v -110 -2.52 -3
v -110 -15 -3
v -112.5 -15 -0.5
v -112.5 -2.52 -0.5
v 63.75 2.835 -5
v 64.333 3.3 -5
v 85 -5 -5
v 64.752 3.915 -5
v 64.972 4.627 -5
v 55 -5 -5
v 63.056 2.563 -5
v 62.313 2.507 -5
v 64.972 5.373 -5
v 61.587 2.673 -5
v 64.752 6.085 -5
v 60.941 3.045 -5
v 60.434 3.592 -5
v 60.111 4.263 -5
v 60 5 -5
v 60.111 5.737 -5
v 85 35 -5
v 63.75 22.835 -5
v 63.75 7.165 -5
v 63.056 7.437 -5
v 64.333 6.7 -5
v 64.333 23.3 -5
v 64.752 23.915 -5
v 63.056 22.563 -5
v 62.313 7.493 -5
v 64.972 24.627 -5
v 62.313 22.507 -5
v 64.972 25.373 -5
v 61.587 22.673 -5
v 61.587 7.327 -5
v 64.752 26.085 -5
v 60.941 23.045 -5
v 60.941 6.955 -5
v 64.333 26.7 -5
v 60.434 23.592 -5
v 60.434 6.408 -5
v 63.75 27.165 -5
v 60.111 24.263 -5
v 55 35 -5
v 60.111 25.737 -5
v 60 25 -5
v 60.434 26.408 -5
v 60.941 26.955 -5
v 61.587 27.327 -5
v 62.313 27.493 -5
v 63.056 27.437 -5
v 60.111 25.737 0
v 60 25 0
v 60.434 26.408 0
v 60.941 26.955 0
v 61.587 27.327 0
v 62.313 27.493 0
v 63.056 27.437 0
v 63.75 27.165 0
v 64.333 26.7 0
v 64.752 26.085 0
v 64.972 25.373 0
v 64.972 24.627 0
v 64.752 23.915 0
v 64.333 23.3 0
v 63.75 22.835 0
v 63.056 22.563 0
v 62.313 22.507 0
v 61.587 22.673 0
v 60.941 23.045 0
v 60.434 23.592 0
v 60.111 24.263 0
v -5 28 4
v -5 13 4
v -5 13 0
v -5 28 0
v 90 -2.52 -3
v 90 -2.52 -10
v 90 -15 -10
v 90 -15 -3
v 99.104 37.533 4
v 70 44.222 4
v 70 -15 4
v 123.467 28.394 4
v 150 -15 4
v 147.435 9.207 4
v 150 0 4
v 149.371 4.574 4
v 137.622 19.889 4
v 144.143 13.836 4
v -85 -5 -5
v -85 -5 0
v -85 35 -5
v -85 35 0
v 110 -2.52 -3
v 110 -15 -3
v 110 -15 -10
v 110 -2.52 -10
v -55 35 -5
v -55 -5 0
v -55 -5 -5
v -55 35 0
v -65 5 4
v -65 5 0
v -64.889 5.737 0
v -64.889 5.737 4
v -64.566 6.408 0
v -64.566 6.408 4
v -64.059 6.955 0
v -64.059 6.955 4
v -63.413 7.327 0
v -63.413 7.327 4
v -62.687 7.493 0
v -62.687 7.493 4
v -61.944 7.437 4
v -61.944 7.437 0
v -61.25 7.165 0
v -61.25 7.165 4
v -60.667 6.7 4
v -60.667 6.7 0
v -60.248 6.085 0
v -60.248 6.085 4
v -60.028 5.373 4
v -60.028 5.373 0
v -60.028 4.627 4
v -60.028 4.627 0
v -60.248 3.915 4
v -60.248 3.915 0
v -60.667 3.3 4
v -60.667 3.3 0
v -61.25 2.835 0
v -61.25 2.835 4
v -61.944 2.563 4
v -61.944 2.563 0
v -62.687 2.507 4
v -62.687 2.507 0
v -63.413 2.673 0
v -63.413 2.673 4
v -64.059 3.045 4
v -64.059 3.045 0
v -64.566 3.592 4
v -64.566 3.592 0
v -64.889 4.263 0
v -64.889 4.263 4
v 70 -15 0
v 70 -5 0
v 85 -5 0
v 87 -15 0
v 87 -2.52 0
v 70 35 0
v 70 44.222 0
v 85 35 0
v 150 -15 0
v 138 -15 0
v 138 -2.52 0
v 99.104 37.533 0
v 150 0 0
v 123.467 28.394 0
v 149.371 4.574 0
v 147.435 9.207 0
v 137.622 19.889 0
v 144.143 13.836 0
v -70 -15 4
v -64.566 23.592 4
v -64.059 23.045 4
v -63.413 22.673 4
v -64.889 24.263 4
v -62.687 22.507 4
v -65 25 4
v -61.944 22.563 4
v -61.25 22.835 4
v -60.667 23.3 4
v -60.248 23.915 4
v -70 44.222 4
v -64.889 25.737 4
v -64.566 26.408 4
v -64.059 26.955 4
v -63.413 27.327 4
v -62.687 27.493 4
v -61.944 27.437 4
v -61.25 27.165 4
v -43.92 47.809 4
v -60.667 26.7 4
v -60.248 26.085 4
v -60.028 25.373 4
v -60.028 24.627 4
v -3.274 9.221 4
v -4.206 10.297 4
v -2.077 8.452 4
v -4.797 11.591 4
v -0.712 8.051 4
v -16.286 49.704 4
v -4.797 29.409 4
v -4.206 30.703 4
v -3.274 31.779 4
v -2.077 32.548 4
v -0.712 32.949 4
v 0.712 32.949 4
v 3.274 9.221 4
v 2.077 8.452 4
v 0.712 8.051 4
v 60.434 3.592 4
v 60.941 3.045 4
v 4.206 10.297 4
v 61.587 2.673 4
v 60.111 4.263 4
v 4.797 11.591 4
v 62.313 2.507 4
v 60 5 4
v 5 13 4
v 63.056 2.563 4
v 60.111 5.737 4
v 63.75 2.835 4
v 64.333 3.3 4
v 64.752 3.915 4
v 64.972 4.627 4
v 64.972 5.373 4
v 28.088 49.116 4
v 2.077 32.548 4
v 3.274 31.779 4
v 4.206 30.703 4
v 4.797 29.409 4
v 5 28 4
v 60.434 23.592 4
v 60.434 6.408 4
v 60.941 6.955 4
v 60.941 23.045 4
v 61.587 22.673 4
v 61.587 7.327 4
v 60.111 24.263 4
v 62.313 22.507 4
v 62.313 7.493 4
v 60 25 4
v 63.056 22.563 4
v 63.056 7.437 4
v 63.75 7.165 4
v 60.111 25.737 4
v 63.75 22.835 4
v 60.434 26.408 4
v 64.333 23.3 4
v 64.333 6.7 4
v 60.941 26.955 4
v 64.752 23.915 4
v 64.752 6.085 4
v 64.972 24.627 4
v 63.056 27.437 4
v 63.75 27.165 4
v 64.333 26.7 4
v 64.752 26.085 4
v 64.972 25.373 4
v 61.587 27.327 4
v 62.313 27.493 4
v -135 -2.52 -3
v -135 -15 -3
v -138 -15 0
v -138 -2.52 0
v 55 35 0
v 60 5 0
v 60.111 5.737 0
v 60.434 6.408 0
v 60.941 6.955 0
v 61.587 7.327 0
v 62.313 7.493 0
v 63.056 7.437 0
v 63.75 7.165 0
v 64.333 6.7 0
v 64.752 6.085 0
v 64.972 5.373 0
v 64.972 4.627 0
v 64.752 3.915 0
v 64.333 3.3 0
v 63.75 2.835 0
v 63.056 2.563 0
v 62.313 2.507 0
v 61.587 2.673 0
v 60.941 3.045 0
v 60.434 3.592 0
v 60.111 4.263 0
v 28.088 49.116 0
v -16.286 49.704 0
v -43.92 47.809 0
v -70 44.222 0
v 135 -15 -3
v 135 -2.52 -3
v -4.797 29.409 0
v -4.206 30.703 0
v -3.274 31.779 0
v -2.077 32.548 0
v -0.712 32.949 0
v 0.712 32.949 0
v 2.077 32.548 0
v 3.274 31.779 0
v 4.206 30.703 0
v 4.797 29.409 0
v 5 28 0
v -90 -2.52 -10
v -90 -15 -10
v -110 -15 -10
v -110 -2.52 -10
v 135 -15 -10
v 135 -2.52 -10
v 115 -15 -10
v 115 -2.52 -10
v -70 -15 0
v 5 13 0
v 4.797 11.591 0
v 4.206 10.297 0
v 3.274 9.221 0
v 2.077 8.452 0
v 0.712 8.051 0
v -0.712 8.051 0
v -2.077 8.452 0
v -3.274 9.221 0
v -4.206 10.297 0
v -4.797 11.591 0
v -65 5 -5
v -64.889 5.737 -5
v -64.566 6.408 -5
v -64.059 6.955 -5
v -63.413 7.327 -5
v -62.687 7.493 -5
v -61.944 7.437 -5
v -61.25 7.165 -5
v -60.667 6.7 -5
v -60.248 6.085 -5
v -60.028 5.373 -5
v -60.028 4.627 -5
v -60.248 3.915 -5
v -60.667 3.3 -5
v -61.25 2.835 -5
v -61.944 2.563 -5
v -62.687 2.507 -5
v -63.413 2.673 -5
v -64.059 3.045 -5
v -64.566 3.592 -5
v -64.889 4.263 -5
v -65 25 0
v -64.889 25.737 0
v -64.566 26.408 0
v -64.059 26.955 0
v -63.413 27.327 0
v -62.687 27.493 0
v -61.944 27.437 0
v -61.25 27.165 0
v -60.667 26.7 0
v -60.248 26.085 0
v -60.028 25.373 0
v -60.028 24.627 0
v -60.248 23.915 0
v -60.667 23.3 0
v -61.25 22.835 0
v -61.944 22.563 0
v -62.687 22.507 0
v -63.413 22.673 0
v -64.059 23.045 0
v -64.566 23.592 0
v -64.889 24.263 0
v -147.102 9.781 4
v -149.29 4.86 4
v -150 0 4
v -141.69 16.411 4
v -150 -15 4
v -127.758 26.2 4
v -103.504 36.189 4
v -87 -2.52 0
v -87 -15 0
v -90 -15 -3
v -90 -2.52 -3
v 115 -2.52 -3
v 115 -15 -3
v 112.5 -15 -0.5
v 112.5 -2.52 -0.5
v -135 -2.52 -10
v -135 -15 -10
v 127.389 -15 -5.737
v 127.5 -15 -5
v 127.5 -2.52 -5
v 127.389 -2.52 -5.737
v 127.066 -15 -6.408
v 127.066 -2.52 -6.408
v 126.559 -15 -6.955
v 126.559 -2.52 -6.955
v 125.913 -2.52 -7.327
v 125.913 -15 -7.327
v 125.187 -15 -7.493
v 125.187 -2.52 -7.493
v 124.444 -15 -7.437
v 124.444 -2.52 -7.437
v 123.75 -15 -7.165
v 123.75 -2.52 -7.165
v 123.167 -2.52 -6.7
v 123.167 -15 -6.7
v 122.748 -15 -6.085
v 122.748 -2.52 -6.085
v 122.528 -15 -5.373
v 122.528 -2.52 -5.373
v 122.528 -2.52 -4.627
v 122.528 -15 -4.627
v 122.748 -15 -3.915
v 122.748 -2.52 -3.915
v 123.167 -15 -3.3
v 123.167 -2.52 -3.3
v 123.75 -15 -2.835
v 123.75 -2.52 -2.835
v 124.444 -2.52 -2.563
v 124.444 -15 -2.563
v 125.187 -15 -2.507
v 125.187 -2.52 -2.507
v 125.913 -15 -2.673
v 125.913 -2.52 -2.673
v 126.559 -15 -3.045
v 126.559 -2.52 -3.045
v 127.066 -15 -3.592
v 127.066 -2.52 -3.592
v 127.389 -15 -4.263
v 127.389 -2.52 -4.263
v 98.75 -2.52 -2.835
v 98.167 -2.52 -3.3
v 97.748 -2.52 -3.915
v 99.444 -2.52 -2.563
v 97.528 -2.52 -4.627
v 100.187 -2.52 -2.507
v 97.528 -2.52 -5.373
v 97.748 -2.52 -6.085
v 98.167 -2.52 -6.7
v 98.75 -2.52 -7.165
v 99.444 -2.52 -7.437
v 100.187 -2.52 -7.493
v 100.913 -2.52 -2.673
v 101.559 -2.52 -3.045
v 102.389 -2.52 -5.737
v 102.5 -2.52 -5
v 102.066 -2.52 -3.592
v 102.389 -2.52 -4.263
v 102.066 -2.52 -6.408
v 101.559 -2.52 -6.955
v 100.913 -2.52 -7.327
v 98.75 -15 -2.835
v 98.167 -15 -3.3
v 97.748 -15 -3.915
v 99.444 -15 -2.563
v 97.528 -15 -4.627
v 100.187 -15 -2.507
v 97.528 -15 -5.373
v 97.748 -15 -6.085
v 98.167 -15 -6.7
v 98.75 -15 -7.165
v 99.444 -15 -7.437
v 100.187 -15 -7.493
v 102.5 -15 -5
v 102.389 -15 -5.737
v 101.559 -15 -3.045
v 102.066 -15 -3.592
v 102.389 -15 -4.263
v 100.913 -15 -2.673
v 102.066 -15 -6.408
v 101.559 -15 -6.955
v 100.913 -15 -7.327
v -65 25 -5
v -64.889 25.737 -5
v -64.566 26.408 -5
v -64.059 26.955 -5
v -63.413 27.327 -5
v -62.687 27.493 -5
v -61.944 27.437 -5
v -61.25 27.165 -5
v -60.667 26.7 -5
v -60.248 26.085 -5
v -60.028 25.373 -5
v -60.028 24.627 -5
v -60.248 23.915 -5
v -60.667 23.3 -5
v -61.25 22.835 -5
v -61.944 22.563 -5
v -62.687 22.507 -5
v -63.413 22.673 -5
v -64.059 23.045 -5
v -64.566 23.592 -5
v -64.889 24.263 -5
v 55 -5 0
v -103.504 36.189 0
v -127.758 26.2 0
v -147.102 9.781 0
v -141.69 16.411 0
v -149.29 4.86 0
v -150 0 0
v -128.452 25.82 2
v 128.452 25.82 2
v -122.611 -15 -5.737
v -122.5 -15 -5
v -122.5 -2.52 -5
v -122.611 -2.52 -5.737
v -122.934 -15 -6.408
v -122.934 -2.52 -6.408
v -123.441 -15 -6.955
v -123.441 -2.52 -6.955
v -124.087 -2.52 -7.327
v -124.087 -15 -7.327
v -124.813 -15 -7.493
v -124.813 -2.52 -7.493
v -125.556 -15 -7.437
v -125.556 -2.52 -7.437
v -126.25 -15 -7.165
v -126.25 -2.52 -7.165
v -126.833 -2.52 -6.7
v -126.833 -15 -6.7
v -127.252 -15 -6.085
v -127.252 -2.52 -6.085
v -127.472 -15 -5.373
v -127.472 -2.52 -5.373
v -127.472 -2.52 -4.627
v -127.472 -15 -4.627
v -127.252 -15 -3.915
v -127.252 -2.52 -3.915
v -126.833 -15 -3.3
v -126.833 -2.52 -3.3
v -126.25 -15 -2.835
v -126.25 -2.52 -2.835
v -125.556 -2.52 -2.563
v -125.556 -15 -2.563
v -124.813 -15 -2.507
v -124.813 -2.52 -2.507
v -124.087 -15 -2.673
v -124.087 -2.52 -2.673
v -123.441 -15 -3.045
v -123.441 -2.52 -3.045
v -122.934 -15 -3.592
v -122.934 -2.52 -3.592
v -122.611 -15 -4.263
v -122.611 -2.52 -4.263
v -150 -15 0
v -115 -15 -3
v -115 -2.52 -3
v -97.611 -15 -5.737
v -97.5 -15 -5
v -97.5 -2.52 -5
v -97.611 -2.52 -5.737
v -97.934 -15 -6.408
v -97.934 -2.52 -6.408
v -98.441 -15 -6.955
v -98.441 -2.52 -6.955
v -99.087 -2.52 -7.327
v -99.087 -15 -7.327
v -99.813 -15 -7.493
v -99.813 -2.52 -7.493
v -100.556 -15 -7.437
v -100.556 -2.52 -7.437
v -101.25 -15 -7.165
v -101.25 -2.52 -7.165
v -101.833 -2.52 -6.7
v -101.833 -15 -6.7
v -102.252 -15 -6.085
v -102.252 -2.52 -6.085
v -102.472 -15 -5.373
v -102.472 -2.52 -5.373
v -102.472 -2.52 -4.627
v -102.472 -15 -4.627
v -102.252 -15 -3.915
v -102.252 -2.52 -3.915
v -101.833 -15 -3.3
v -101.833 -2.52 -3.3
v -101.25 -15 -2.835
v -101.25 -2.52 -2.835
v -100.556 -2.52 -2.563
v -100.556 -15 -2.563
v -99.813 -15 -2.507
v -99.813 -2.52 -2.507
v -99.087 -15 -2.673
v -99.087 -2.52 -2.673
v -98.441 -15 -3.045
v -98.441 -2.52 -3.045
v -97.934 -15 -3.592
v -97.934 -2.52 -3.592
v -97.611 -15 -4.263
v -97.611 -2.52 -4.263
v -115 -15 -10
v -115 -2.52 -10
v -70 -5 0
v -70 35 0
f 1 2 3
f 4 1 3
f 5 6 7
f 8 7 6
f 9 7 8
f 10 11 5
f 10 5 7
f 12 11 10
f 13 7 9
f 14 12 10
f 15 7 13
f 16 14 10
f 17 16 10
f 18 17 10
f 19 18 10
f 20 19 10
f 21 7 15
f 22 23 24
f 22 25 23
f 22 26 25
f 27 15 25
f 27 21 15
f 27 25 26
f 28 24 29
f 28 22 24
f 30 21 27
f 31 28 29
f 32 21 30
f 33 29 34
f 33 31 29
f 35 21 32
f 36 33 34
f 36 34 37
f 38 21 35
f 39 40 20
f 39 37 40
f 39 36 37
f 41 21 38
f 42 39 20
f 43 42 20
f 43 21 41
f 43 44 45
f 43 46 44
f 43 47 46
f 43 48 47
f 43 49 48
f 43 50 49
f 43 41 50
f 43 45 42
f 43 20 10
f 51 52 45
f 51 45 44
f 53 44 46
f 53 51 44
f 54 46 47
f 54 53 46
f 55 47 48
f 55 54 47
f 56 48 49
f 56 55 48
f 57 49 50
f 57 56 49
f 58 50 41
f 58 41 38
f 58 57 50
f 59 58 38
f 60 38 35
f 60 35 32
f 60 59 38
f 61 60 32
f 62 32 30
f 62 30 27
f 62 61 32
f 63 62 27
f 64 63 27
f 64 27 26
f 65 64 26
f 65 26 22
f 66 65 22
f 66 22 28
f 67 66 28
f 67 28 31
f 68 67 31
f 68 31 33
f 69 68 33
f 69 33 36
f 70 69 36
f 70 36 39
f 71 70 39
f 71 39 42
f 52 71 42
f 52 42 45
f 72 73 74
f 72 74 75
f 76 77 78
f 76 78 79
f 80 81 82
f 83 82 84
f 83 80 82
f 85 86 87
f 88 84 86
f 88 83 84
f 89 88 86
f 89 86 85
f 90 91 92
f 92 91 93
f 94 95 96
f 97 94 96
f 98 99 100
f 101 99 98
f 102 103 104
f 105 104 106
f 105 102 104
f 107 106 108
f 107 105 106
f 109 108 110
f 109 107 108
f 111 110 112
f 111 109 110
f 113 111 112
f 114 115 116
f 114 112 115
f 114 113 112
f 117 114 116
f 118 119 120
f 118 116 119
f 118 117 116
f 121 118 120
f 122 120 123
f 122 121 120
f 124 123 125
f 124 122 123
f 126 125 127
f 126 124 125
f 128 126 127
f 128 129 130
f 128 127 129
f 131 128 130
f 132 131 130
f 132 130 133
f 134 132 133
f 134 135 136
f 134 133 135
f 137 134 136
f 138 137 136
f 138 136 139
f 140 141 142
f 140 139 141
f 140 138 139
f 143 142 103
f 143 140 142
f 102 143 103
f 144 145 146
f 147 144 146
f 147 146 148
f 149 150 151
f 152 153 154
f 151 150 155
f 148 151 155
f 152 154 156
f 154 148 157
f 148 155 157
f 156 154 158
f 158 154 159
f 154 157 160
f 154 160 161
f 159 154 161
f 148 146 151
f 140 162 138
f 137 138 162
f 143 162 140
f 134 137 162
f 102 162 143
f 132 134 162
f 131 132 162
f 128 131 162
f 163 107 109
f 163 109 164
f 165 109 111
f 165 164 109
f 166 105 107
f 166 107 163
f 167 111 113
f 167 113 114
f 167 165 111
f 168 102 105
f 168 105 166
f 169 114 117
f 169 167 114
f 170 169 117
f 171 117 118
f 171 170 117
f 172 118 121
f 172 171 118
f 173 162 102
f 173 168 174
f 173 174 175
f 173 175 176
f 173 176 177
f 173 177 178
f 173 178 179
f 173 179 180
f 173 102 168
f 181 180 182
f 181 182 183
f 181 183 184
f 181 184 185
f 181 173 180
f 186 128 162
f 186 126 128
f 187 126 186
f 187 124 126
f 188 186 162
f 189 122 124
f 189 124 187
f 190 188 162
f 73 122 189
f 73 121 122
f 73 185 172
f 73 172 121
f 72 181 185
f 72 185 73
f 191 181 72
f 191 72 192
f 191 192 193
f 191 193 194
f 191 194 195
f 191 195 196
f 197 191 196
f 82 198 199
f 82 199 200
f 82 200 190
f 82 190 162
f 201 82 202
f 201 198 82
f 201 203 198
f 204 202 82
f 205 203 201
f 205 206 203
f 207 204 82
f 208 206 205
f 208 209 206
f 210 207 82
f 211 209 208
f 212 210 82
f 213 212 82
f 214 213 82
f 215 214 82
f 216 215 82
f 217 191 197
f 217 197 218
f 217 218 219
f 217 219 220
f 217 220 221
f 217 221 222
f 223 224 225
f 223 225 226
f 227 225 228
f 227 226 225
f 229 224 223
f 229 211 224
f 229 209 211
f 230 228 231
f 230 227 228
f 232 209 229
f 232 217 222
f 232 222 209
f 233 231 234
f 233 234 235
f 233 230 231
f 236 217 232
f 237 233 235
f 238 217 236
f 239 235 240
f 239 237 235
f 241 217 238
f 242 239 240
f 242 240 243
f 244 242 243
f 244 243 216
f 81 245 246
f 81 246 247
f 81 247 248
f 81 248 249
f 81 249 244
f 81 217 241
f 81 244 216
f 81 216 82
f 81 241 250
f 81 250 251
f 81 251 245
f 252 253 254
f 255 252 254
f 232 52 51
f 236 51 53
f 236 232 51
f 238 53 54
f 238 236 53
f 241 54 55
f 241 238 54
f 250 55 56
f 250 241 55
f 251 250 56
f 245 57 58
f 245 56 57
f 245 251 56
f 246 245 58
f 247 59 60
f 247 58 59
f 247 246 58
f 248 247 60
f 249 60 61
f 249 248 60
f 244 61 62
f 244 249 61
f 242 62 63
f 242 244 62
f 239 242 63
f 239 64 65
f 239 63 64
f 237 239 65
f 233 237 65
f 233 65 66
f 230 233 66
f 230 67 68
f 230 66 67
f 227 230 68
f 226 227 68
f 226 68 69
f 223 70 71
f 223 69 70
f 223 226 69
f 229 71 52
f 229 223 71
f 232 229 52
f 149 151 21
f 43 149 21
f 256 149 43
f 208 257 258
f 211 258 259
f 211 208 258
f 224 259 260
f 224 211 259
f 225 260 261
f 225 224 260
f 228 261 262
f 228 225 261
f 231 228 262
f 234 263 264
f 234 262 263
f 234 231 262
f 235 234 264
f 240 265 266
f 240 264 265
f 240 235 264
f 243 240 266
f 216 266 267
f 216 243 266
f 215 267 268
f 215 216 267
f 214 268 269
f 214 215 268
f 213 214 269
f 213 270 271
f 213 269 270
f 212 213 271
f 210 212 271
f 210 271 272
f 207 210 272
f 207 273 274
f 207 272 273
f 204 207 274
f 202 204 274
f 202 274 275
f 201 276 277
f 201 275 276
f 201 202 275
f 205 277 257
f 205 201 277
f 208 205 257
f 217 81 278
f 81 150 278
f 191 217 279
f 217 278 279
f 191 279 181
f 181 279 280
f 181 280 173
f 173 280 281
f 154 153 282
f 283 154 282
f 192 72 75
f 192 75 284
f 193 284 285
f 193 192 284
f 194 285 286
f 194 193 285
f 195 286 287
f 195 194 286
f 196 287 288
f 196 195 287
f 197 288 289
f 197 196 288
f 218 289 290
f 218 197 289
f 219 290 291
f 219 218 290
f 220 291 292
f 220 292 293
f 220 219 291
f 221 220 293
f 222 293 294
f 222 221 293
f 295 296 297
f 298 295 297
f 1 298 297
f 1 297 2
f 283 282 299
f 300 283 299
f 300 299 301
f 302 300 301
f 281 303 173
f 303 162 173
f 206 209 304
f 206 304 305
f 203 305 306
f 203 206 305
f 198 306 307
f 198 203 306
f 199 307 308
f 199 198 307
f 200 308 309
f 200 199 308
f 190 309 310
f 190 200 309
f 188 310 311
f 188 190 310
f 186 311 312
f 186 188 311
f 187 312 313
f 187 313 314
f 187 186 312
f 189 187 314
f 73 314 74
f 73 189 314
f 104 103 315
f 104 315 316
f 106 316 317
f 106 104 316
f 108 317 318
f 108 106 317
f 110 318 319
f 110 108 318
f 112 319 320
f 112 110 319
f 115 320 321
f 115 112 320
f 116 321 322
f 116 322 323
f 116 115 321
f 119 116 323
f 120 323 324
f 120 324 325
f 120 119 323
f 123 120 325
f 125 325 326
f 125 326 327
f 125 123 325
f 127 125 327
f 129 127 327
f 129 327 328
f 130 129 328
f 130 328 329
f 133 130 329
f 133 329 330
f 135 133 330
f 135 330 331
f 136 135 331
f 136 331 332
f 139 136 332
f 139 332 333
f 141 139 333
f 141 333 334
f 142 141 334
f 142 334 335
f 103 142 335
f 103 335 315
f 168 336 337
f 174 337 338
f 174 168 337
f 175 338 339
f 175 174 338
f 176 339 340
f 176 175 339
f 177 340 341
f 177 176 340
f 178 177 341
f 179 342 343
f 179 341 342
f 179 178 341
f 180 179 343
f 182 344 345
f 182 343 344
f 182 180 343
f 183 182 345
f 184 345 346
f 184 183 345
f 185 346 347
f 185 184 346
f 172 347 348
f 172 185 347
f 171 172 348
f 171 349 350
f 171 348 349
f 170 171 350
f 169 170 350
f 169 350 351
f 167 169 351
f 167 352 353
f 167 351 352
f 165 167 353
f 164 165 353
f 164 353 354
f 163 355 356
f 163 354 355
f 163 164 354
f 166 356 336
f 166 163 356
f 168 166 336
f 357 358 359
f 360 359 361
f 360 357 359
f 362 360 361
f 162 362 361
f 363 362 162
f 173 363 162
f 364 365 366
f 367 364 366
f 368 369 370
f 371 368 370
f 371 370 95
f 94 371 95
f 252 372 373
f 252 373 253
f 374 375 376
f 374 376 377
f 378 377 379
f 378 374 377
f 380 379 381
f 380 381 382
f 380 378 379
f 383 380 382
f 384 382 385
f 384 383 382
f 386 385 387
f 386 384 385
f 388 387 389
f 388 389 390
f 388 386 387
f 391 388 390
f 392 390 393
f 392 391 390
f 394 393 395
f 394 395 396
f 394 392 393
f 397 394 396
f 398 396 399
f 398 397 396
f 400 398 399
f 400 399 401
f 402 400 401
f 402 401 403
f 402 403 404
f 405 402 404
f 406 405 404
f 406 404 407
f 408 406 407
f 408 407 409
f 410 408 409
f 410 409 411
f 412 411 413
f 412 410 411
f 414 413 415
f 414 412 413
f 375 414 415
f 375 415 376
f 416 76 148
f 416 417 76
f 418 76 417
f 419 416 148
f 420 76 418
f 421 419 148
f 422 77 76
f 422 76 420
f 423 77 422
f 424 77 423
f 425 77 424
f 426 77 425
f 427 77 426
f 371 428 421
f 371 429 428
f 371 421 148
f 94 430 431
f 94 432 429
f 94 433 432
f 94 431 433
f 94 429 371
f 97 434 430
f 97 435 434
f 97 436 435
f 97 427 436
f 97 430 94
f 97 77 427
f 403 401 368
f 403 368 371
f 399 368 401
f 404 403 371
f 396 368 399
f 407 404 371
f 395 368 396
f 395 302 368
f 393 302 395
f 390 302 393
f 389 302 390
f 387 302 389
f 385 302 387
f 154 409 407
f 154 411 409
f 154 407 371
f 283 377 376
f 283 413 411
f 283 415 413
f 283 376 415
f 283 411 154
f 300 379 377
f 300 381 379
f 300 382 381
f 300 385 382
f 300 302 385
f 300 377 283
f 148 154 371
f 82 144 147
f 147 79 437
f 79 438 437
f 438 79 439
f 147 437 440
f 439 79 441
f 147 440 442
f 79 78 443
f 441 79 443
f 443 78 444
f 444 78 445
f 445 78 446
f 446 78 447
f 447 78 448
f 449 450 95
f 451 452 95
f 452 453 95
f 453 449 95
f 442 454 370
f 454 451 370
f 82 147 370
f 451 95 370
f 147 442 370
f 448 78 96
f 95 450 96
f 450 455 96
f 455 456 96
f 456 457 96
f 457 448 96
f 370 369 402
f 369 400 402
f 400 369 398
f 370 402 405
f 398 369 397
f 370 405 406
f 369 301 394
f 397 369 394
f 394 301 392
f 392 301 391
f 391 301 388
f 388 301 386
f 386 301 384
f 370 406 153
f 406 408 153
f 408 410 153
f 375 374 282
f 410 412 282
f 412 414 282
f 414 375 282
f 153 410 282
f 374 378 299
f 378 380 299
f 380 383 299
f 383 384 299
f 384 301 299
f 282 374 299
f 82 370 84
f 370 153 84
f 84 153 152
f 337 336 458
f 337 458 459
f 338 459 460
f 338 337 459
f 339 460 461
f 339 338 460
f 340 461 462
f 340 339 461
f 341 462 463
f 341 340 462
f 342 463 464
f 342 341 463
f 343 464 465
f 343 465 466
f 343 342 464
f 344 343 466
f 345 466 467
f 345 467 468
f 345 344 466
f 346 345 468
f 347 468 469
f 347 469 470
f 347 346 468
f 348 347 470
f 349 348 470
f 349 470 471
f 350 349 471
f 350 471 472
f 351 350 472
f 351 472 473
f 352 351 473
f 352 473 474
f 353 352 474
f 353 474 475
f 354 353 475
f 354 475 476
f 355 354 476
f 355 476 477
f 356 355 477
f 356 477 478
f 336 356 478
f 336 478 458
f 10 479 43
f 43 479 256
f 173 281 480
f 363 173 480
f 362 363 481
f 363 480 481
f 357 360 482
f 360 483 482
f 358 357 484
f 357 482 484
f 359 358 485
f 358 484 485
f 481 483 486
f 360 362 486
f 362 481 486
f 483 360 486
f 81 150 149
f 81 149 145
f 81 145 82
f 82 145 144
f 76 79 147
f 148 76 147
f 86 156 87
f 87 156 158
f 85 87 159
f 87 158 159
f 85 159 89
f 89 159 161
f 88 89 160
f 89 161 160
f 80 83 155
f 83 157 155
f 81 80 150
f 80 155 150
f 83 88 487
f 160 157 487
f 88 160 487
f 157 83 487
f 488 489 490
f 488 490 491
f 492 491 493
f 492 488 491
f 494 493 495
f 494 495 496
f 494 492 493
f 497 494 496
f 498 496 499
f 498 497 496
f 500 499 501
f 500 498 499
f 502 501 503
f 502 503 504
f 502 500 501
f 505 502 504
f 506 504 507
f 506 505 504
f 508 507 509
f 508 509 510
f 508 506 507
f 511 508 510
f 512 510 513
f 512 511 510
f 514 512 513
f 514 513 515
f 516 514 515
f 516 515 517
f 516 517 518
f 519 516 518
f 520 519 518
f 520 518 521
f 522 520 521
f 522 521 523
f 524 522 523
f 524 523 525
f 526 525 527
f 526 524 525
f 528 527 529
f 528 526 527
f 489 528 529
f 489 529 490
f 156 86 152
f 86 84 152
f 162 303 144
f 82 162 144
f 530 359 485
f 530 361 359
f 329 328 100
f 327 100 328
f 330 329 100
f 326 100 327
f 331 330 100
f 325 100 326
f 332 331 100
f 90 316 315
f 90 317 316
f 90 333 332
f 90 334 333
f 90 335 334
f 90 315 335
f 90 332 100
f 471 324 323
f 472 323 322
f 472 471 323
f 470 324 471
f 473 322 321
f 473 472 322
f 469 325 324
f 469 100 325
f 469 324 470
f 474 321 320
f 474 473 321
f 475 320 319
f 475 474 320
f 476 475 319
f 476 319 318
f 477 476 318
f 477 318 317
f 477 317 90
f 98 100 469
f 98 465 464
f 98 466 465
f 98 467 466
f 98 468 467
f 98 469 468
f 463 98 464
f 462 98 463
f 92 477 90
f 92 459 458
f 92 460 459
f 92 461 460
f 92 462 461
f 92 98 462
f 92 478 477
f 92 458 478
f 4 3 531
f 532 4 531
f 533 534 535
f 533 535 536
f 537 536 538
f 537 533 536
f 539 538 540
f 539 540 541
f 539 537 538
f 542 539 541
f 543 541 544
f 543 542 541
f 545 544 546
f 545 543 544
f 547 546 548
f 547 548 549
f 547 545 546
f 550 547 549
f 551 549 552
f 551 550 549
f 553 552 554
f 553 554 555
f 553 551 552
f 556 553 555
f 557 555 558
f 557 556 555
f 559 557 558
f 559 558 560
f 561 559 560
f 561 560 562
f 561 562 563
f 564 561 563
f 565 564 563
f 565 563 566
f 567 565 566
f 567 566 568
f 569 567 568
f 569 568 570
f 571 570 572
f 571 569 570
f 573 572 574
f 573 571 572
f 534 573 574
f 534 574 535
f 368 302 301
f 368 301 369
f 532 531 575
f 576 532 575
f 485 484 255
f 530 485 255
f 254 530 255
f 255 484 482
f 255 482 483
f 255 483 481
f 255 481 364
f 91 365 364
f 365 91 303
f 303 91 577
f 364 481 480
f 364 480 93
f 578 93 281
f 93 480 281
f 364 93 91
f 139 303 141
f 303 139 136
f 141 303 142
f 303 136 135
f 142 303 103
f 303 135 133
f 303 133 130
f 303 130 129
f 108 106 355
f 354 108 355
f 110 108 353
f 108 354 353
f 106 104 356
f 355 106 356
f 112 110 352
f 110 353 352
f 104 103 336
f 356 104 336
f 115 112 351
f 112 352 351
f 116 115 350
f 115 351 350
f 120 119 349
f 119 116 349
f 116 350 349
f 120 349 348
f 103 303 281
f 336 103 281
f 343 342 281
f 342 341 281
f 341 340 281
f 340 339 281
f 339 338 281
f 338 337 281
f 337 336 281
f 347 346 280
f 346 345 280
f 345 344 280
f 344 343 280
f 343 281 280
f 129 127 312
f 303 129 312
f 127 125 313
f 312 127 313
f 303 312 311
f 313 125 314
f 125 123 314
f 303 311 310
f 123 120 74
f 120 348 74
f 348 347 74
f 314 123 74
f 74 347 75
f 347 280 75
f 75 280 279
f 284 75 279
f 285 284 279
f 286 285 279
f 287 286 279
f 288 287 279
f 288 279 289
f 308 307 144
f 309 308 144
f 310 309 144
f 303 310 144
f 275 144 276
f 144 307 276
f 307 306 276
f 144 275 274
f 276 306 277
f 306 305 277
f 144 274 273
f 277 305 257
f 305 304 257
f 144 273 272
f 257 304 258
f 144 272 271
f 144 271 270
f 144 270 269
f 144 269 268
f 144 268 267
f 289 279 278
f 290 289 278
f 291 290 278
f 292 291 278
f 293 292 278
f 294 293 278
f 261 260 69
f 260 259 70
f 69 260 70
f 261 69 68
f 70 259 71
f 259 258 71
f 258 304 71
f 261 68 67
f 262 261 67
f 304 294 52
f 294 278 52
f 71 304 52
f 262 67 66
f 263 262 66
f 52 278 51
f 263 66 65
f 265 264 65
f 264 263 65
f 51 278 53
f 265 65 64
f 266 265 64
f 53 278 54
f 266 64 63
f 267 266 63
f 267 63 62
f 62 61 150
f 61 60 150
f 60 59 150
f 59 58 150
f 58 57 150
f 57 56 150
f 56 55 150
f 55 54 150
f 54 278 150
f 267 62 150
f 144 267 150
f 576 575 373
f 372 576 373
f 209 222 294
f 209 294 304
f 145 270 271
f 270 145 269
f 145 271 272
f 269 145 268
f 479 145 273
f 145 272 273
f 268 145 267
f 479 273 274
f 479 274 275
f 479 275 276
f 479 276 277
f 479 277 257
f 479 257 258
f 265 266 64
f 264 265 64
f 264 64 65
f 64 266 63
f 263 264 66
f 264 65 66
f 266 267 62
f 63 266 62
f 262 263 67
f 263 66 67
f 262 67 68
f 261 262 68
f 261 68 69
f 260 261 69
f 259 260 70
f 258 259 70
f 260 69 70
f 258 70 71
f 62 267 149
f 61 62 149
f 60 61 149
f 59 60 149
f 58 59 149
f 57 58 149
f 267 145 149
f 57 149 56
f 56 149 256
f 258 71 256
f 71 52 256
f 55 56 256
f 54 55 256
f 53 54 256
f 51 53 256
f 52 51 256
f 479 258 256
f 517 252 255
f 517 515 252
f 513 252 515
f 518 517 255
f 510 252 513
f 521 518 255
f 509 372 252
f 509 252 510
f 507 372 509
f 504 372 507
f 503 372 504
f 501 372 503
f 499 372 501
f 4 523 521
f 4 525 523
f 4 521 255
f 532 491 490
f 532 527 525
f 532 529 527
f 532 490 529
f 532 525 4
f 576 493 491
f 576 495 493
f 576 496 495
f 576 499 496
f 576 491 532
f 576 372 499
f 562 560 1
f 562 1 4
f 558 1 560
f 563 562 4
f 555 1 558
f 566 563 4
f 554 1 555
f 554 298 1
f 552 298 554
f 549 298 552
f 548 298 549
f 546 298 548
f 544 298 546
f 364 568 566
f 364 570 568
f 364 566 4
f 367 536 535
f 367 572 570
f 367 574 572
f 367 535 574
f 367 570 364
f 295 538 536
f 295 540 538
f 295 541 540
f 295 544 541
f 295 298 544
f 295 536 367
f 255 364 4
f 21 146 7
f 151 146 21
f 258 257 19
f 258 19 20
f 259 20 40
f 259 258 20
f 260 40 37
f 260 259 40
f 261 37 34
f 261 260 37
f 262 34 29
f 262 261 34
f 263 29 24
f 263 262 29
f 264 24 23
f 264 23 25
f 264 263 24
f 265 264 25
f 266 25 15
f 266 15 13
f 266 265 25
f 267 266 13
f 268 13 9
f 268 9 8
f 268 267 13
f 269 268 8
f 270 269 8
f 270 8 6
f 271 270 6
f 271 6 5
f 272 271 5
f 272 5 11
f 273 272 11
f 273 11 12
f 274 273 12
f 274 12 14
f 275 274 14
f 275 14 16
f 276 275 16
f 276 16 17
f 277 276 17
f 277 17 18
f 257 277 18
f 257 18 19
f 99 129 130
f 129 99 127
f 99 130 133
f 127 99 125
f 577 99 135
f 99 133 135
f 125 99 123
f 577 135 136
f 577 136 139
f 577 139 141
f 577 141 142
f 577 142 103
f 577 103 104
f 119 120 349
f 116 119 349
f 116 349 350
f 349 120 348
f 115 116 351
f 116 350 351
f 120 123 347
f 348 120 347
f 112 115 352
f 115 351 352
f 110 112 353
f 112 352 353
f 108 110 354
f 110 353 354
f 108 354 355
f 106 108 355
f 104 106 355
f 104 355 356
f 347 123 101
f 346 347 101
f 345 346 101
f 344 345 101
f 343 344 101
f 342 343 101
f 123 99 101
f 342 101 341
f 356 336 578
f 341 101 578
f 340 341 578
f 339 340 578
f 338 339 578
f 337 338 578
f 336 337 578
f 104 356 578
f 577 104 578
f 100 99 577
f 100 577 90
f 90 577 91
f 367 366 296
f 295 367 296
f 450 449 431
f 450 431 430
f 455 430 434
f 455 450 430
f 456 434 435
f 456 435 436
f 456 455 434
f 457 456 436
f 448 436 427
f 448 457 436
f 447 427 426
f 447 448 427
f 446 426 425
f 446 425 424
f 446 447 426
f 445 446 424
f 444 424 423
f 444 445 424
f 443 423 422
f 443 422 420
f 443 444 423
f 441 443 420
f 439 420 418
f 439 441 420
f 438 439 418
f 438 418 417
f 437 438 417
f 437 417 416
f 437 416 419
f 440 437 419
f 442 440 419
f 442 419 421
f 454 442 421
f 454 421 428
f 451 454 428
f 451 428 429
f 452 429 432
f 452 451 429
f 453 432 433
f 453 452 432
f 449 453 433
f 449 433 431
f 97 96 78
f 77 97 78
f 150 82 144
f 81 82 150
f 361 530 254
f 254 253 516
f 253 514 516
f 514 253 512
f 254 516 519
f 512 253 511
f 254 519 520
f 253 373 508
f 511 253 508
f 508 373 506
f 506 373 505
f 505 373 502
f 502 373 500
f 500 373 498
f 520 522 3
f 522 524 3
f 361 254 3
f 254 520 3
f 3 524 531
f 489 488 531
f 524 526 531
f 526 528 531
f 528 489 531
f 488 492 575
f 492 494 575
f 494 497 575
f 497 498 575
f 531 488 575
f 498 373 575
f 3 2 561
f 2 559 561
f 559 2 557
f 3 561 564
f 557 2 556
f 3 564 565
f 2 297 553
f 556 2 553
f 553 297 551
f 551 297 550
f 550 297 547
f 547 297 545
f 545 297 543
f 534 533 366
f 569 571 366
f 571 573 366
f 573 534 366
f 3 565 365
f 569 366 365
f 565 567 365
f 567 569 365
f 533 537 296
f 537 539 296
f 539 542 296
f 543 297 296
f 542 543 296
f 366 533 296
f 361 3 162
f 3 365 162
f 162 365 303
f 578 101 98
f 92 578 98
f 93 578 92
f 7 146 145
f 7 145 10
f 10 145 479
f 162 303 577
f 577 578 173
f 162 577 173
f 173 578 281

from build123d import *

# Parameters (mm, degrees)
ESQUISSE1_RX                   = 150
ESQUISSE1_RY                   = 50
BOSS_EXTRU_2_DEPTH             = 4
ESQUISSE2_W                    = 328.393114187
ESQUISSE2_H                    = 54.583456932
ENL_V_MAT_EXTRU_1_DEPTH        = 4
ENL_V_MAT_EXTRU_2_DEPTH        = 4
ESQUISSE5_W                    = 300
ESQUISSE5_H                    = 4
BOSS_EXTRU_3_DEPTH             = 15
ESQUISSE8_W                    = 20
ESQUISSE8_H                    = 12.480168935
BOSS_EXTRU_5_DEPTH             = 10
ESQUISSE9_R                    = 2.5
ENL_V_MAT_EXTRU_4_DEPTH        = 12.480168935
CHANFREIN1_SIZE                = 3
R_P_TITION_START               = -15
R_P_TITION_LIN_AIRE2_OUTLINE_R = 2.5
R_P_TITION_LIN_AIRE2_DEPTH     = 12.480168935
R_P_TITION_LIN_AIRE3_OUTLINE_R = 2.5
R_P_TITION_LIN_AIRE3_DEPTH     = 12.480168935
ESQUISSE15_W                   = 30
ESQUISSE15_H                   = 40
BOSS_EXTRU_7_DEPTH             = 5
BOSS_EXTRU_7_2_DEPTH           = 5
ENL_V_START                    = -9
ESQUISSE16_R                   = 2.5
ENL_V_MAT_EXTRU_7_DEPTH        = 9
FRACTIONNER2_START             = -150
FRACTIONNER2_DEPTH             = 80
FRACTIONNER2_START_2           = 70
FRACTIONNER2_2_DEPTH           = 80
FRACTIONNER2_START_3           = -15
FRACTIONNER2_3_OUTLINE_R       = 2.5
FRACTIONNER2_3_DEPTH           = 12.480168935
FRACTIONNER2_START_4           = -2.519831065
FRACTIONNER2_4_OUTLINE_W       = 80
FRACTIONNER2_4_OUTLINE_H       = 4
FRACTIONNER2_4_DEPTH           = 2.519831065
FRACTIONNER2_5_DEPTH           = 4
FRACTIONNER2_6_OUTLINE_R       = 2.5
FRACTIONNER2_6_DEPTH           = 12.480168935
FRACTIONNER2_7_OUTLINE_W       = 80
FRACTIONNER2_7_OUTLINE_H       = 4
FRACTIONNER2_7_DEPTH           = 2.519831065
FRACTIONNER2_8_DEPTH           = 4


with BuildPart() as part:
    # Esquisse1 → Boss.-Extru.2 (new body)
    with BuildSketch(Plane.XY):
        with Locations((0, 0)):
            Ellipse(ESQUISSE1_RX, ESQUISSE1_RY)
    extrude(amount=BOSS_EXTRU_2_DEPTH)

    # Esquisse2 → Enlèv. mat.-Extru.1 (cut)
    with BuildSketch(Plane.XY.offset(4)):
        with Locations((5.354235558, -27.291728466)):
            Rectangle(ESQUISSE2_W, ESQUISSE2_H)
    extrude(amount=-ENL_V_MAT_EXTRU_1_DEPTH, mode=Mode.SUBTRACT)

    # Esquisse3 → Enlèv. mat.-Extru.2 (cut)
    with BuildSketch(Plane.XY.offset(4)):
        with BuildLine():
            Line((5, 28), (5, 13))
            ThreePointArc((5, 13), (0, 8), (-5, 13))
            Line((-5, 13), (-5, 28))
            ThreePointArc((-5, 28), (0, 33), (5, 28))
        make_face()
    extrude(amount=-ENL_V_MAT_EXTRU_2_DEPTH, mode=Mode.SUBTRACT)

    # Esquisse5 → Boss.-Extru.3 (add)
    with BuildSketch(Plane.XZ):
        with Locations((0, 2)):
            Rectangle(ESQUISSE5_W, ESQUISSE5_H)
    extrude(amount=BOSS_EXTRU_3_DEPTH)

    # Esquisse8 → Boss.-Extru.5 (add)
    with BuildSketch(Plane(origin=(0, 0, 0), x_dir=(-1, 0, 0), z_dir=(0, 0, -1))):
        with Locations((-125, -8.759915533)):
            Rectangle(ESQUISSE8_W, ESQUISSE8_H)
    extrude(amount=BOSS_EXTRU_5_DEPTH)

    # Esquisse9 → Enlèv. mat.-Extru.4 (cut)
    with BuildSketch(Plane(origin=(0, -2.519831065, 0), x_dir=(1, 0, 0), z_dir=(0, 1, 0))):
        with Locations(Location((125, 5, 0), (0, 0, 270))):
            Circle(ESQUISSE9_R)
    extrude(amount=-ENL_V_MAT_EXTRU_4_DEPTH, mode=Mode.SUBTRACT)

    # Chanfrein1
    chanfrein1_edges = [part.edges().sort_by_distance(p)[0] for p in [
        (135, -8.759915532, 0),
        (115, -8.759915532, 0),
    ]]
    chamfer(chanfrein1_edges, length=CHANFREIN1_SIZE)

    # Répétition linéaire2: read off the stored shape, not the designer's step
    # Répétition linéaire2 outline → Répétition linéaire2 (add)
    with BuildSketch(Plane(origin=(0, 0, 0), x_dir=(1, 0, 0), z_dir=(0, 1, 0)).offset(R_P_TITION_START)):
        Polygon((110, 10), (90, 10), (90, 3), (87, 0), (112, 0), (112.5, 0.5), (110, 3), align=None)
        with Locations((100, 5)):
            Circle(R_P_TITION_LIN_AIRE2_OUTLINE_R, mode=Mode.SUBTRACT)
    extrude(amount=R_P_TITION_LIN_AIRE2_DEPTH)

    # Répétition linéaire3: read off the stored shape, not the designer's step
    # Répétition linéaire3 outline → Répétition linéaire3 (add)
    with BuildSketch(Plane(origin=(0, 0, 0), x_dir=(1, 0, 0), z_dir=(0, 1, 0)).offset(R_P_TITION_START)):
        Polygon((-90, 10), (-110, 10), (-110, 3), (-112.5, 0.5), (-115, 3), (-115, 10), (-135, 10), (-135, 3), (-138, 0), (-87, 0), (-90, 3), align=None)
        with Locations((-125, 5)):
            Circle(R_P_TITION_LIN_AIRE3_OUTLINE_R, mode=Mode.SUBTRACT)
        with Locations((-100, 5)):
            Circle(R_P_TITION_LIN_AIRE3_OUTLINE_R, mode=Mode.SUBTRACT)
    extrude(amount=R_P_TITION_LIN_AIRE3_DEPTH)


with BuildPart() as body_2:
    # Esquisse15 → Boss.-Extru.7 (new body)
    with BuildSketch(Plane(origin=(0, 0, 0), x_dir=(-1, 0, 0), z_dir=(0, 0, -1))):
        with Locations((-70, 15)):
            Rectangle(ESQUISSE15_W, ESQUISSE15_H)
    extrude(amount=BOSS_EXTRU_7_DEPTH)


with BuildPart() as body_3:
    # Esquisse15 → Boss.-Extru.7 2 (new body)
    with BuildSketch(Plane(origin=(0, 0, 0), x_dir=(-1, 0, 0), z_dir=(0, 0, -1))):
        with Locations((70, 15)):
            Rectangle(ESQUISSE15_W, ESQUISSE15_H)
    extrude(amount=BOSS_EXTRU_7_2_DEPTH)


with BuildPart() as enl_v_mat_extru_7_tool:
    # Esquisse16 → Enlèv. mat.-Extru.7 (new body)
    with BuildSketch(Plane(origin=(0, 0, -5), x_dir=(-1, 0, 0), z_dir=(0, 0, -1)).offset(ENL_V_START)):
        with Locations((-62.5, 25)):
            Circle(ESQUISSE16_R)
        with Locations((62.5, 25)):
            Circle(ESQUISSE16_R)
        with Locations((-62.5, 5)):
            Circle(ESQUISSE16_R)
        with Locations((62.5, 5)):
            Circle(ESQUISSE16_R)
    extrude(amount=ENL_V_MAT_EXTRU_7_DEPTH)


with BuildPart() as part_1:
    add(part.part)

    # Enlèv. mat.-Extru.7: cut by enl_v_mat_extru_7_tool
    add(enl_v_mat_extru_7_tool.part, mode=Mode.SUBTRACT)

    # Fractionner2: read off the stored shape, not the designer's step
    # Fractionner2 outline → Fractionner2 (cut)
    with BuildSketch(Plane.YZ.offset(FRACTIONNER2_START)):
        Polygon((-2.519831065, -10), (-2.519831065, 0), (46, 0), (46, 4), (-15, 4), (-15, -10), align=None)
    extrude(amount=FRACTIONNER2_DEPTH, mode=Mode.SUBTRACT)

    # Fractionner2 2 outline → Fractionner2 2 (cut)
    with BuildSketch(Plane.YZ.offset(FRACTIONNER2_START_2)):
        Polygon((-2.519831065, -10), (-2.519831065, 0), (46, 0), (46, 4), (-15, 4), (-15, -10), align=None)
    extrude(amount=FRACTIONNER2_2_DEPTH, mode=Mode.SUBTRACT)


with BuildPart() as body_2_1:
    add(body_2.part)

    # Enlèv. mat.-Extru.7: cut by enl_v_mat_extru_7_tool
    add(enl_v_mat_extru_7_tool.part, mode=Mode.SUBTRACT)


with BuildPart() as body_3_1:
    add(body_3.part)

    # Enlèv. mat.-Extru.7: cut by enl_v_mat_extru_7_tool
    add(enl_v_mat_extru_7_tool.part, mode=Mode.SUBTRACT)


with BuildPart() as body_4:
    # Fractionner2 3 outline → Fractionner2 3 (new body)
    with BuildSketch(Plane(origin=(0, 0, 0), x_dir=(1, 0, 0), z_dir=(0, 1, 0)).offset(FRACTIONNER2_START_3)):
        Polygon((-70, -4), (-70, 0), (-87, 0), (-90, 3), (-90, 10), (-110, 10), (-110, 3), (-112.5, 0.5), (-115, 3), (-115, 10), (-135, 10), (-135, 3), (-138, 0), (-150, 0), (-150, -4), align=None)
        with Locations((-100, 5)):
            Circle(FRACTIONNER2_3_OUTLINE_R, mode=Mode.SUBTRACT)
        with Locations((-125, 5)):
            Circle(FRACTIONNER2_3_OUTLINE_R, mode=Mode.SUBTRACT)
    extrude(amount=FRACTIONNER2_3_DEPTH)

    # Fractionner2 4 outline → Fractionner2 4 (add)
    with BuildSketch(Plane(origin=(0, 0, 0), x_dir=(1, 0, 0), z_dir=(0, 1, 0)).offset(FRACTIONNER2_START_4)):
        with Locations((-110, -2)):
            Rectangle(FRACTIONNER2_4_OUTLINE_W, FRACTIONNER2_4_OUTLINE_H)
    extrude(amount=FRACTIONNER2_4_DEPTH)

    # Fractionner2 5 outline → Fractionner2 5 (add)
    with BuildSketch(Plane.XY):
        with BuildLine():
            Line((-70, 0), (-70, 44.221663871))
            add(Edge.make_bspline(
                [(-70, 44.221663871), (-150, 30.151134458), (-150, 0)],
                knots=[2.056314449, 2.056314449, 2.056314449, 3.141592654, 3.141592654, 3.141592654], degree=2, weights=[1, 0.856348839, 1]))
            Line((-150, 0), (-70, 0))
        make_face()
    extrude(amount=FRACTIONNER2_5_DEPTH)

    # Fractionner3: read off the stored shape, not the designer's step
    # Fractionner3: union body 3
    add(body_3_1.part)


with BuildPart() as body_5:
    # Fractionner2 6 outline → Fractionner2 6 (new body)
    with BuildSketch(Plane(origin=(0, 0, 0), x_dir=(1, 0, 0), z_dir=(0, 1, 0)).offset(FRACTIONNER2_START_3)):
        Polygon((87, 0), (70, 0), (70, -4), (150, -4), (150, 0), (138, 0), (135, 3), (135, 10), (115, 10), (115, 3), (112.5, 0.5), (110, 3), (110, 10), (90, 10), (90, 3), align=None)
        with Locations((125, 5)):
            Circle(FRACTIONNER2_6_OUTLINE_R, mode=Mode.SUBTRACT)
        with Locations((100, 5)):
            Circle(FRACTIONNER2_6_OUTLINE_R, mode=Mode.SUBTRACT)
    extrude(amount=FRACTIONNER2_6_DEPTH)

    # Fractionner2 7 outline → Fractionner2 7 (add)
    with BuildSketch(Plane(origin=(0, 0, 0), x_dir=(1, 0, 0), z_dir=(0, 1, 0)).offset(FRACTIONNER2_START_4)):
        with Locations((110, -2)):
            Rectangle(FRACTIONNER2_7_OUTLINE_W, FRACTIONNER2_7_OUTLINE_H)
    extrude(amount=FRACTIONNER2_7_DEPTH)

    # Fractionner2 8 outline → Fractionner2 8 (add)
    with BuildSketch(Plane.XY):
        with BuildLine():
            Line((70, 0), (150, 0))
            add(Edge.make_bspline(
                [(150, 0), (150, 30.151134458), (70, 44.221663871)],
                knots=[0, 0, 0, 1.085278204, 1.085278204, 1.085278204], degree=2, weights=[1, 0.856348839, 1]))
            Line((70, 44.221663871), (70, 0))
        make_face()
    extrude(amount=FRACTIONNER2_8_DEPTH)


with BuildPart() as body_2_2:
    add(body_2_1.part)

    # Combiner3: union body 5
    add(body_5.part)


solid = Compound([part_1.part, body_4.part, body_2_2.part])
